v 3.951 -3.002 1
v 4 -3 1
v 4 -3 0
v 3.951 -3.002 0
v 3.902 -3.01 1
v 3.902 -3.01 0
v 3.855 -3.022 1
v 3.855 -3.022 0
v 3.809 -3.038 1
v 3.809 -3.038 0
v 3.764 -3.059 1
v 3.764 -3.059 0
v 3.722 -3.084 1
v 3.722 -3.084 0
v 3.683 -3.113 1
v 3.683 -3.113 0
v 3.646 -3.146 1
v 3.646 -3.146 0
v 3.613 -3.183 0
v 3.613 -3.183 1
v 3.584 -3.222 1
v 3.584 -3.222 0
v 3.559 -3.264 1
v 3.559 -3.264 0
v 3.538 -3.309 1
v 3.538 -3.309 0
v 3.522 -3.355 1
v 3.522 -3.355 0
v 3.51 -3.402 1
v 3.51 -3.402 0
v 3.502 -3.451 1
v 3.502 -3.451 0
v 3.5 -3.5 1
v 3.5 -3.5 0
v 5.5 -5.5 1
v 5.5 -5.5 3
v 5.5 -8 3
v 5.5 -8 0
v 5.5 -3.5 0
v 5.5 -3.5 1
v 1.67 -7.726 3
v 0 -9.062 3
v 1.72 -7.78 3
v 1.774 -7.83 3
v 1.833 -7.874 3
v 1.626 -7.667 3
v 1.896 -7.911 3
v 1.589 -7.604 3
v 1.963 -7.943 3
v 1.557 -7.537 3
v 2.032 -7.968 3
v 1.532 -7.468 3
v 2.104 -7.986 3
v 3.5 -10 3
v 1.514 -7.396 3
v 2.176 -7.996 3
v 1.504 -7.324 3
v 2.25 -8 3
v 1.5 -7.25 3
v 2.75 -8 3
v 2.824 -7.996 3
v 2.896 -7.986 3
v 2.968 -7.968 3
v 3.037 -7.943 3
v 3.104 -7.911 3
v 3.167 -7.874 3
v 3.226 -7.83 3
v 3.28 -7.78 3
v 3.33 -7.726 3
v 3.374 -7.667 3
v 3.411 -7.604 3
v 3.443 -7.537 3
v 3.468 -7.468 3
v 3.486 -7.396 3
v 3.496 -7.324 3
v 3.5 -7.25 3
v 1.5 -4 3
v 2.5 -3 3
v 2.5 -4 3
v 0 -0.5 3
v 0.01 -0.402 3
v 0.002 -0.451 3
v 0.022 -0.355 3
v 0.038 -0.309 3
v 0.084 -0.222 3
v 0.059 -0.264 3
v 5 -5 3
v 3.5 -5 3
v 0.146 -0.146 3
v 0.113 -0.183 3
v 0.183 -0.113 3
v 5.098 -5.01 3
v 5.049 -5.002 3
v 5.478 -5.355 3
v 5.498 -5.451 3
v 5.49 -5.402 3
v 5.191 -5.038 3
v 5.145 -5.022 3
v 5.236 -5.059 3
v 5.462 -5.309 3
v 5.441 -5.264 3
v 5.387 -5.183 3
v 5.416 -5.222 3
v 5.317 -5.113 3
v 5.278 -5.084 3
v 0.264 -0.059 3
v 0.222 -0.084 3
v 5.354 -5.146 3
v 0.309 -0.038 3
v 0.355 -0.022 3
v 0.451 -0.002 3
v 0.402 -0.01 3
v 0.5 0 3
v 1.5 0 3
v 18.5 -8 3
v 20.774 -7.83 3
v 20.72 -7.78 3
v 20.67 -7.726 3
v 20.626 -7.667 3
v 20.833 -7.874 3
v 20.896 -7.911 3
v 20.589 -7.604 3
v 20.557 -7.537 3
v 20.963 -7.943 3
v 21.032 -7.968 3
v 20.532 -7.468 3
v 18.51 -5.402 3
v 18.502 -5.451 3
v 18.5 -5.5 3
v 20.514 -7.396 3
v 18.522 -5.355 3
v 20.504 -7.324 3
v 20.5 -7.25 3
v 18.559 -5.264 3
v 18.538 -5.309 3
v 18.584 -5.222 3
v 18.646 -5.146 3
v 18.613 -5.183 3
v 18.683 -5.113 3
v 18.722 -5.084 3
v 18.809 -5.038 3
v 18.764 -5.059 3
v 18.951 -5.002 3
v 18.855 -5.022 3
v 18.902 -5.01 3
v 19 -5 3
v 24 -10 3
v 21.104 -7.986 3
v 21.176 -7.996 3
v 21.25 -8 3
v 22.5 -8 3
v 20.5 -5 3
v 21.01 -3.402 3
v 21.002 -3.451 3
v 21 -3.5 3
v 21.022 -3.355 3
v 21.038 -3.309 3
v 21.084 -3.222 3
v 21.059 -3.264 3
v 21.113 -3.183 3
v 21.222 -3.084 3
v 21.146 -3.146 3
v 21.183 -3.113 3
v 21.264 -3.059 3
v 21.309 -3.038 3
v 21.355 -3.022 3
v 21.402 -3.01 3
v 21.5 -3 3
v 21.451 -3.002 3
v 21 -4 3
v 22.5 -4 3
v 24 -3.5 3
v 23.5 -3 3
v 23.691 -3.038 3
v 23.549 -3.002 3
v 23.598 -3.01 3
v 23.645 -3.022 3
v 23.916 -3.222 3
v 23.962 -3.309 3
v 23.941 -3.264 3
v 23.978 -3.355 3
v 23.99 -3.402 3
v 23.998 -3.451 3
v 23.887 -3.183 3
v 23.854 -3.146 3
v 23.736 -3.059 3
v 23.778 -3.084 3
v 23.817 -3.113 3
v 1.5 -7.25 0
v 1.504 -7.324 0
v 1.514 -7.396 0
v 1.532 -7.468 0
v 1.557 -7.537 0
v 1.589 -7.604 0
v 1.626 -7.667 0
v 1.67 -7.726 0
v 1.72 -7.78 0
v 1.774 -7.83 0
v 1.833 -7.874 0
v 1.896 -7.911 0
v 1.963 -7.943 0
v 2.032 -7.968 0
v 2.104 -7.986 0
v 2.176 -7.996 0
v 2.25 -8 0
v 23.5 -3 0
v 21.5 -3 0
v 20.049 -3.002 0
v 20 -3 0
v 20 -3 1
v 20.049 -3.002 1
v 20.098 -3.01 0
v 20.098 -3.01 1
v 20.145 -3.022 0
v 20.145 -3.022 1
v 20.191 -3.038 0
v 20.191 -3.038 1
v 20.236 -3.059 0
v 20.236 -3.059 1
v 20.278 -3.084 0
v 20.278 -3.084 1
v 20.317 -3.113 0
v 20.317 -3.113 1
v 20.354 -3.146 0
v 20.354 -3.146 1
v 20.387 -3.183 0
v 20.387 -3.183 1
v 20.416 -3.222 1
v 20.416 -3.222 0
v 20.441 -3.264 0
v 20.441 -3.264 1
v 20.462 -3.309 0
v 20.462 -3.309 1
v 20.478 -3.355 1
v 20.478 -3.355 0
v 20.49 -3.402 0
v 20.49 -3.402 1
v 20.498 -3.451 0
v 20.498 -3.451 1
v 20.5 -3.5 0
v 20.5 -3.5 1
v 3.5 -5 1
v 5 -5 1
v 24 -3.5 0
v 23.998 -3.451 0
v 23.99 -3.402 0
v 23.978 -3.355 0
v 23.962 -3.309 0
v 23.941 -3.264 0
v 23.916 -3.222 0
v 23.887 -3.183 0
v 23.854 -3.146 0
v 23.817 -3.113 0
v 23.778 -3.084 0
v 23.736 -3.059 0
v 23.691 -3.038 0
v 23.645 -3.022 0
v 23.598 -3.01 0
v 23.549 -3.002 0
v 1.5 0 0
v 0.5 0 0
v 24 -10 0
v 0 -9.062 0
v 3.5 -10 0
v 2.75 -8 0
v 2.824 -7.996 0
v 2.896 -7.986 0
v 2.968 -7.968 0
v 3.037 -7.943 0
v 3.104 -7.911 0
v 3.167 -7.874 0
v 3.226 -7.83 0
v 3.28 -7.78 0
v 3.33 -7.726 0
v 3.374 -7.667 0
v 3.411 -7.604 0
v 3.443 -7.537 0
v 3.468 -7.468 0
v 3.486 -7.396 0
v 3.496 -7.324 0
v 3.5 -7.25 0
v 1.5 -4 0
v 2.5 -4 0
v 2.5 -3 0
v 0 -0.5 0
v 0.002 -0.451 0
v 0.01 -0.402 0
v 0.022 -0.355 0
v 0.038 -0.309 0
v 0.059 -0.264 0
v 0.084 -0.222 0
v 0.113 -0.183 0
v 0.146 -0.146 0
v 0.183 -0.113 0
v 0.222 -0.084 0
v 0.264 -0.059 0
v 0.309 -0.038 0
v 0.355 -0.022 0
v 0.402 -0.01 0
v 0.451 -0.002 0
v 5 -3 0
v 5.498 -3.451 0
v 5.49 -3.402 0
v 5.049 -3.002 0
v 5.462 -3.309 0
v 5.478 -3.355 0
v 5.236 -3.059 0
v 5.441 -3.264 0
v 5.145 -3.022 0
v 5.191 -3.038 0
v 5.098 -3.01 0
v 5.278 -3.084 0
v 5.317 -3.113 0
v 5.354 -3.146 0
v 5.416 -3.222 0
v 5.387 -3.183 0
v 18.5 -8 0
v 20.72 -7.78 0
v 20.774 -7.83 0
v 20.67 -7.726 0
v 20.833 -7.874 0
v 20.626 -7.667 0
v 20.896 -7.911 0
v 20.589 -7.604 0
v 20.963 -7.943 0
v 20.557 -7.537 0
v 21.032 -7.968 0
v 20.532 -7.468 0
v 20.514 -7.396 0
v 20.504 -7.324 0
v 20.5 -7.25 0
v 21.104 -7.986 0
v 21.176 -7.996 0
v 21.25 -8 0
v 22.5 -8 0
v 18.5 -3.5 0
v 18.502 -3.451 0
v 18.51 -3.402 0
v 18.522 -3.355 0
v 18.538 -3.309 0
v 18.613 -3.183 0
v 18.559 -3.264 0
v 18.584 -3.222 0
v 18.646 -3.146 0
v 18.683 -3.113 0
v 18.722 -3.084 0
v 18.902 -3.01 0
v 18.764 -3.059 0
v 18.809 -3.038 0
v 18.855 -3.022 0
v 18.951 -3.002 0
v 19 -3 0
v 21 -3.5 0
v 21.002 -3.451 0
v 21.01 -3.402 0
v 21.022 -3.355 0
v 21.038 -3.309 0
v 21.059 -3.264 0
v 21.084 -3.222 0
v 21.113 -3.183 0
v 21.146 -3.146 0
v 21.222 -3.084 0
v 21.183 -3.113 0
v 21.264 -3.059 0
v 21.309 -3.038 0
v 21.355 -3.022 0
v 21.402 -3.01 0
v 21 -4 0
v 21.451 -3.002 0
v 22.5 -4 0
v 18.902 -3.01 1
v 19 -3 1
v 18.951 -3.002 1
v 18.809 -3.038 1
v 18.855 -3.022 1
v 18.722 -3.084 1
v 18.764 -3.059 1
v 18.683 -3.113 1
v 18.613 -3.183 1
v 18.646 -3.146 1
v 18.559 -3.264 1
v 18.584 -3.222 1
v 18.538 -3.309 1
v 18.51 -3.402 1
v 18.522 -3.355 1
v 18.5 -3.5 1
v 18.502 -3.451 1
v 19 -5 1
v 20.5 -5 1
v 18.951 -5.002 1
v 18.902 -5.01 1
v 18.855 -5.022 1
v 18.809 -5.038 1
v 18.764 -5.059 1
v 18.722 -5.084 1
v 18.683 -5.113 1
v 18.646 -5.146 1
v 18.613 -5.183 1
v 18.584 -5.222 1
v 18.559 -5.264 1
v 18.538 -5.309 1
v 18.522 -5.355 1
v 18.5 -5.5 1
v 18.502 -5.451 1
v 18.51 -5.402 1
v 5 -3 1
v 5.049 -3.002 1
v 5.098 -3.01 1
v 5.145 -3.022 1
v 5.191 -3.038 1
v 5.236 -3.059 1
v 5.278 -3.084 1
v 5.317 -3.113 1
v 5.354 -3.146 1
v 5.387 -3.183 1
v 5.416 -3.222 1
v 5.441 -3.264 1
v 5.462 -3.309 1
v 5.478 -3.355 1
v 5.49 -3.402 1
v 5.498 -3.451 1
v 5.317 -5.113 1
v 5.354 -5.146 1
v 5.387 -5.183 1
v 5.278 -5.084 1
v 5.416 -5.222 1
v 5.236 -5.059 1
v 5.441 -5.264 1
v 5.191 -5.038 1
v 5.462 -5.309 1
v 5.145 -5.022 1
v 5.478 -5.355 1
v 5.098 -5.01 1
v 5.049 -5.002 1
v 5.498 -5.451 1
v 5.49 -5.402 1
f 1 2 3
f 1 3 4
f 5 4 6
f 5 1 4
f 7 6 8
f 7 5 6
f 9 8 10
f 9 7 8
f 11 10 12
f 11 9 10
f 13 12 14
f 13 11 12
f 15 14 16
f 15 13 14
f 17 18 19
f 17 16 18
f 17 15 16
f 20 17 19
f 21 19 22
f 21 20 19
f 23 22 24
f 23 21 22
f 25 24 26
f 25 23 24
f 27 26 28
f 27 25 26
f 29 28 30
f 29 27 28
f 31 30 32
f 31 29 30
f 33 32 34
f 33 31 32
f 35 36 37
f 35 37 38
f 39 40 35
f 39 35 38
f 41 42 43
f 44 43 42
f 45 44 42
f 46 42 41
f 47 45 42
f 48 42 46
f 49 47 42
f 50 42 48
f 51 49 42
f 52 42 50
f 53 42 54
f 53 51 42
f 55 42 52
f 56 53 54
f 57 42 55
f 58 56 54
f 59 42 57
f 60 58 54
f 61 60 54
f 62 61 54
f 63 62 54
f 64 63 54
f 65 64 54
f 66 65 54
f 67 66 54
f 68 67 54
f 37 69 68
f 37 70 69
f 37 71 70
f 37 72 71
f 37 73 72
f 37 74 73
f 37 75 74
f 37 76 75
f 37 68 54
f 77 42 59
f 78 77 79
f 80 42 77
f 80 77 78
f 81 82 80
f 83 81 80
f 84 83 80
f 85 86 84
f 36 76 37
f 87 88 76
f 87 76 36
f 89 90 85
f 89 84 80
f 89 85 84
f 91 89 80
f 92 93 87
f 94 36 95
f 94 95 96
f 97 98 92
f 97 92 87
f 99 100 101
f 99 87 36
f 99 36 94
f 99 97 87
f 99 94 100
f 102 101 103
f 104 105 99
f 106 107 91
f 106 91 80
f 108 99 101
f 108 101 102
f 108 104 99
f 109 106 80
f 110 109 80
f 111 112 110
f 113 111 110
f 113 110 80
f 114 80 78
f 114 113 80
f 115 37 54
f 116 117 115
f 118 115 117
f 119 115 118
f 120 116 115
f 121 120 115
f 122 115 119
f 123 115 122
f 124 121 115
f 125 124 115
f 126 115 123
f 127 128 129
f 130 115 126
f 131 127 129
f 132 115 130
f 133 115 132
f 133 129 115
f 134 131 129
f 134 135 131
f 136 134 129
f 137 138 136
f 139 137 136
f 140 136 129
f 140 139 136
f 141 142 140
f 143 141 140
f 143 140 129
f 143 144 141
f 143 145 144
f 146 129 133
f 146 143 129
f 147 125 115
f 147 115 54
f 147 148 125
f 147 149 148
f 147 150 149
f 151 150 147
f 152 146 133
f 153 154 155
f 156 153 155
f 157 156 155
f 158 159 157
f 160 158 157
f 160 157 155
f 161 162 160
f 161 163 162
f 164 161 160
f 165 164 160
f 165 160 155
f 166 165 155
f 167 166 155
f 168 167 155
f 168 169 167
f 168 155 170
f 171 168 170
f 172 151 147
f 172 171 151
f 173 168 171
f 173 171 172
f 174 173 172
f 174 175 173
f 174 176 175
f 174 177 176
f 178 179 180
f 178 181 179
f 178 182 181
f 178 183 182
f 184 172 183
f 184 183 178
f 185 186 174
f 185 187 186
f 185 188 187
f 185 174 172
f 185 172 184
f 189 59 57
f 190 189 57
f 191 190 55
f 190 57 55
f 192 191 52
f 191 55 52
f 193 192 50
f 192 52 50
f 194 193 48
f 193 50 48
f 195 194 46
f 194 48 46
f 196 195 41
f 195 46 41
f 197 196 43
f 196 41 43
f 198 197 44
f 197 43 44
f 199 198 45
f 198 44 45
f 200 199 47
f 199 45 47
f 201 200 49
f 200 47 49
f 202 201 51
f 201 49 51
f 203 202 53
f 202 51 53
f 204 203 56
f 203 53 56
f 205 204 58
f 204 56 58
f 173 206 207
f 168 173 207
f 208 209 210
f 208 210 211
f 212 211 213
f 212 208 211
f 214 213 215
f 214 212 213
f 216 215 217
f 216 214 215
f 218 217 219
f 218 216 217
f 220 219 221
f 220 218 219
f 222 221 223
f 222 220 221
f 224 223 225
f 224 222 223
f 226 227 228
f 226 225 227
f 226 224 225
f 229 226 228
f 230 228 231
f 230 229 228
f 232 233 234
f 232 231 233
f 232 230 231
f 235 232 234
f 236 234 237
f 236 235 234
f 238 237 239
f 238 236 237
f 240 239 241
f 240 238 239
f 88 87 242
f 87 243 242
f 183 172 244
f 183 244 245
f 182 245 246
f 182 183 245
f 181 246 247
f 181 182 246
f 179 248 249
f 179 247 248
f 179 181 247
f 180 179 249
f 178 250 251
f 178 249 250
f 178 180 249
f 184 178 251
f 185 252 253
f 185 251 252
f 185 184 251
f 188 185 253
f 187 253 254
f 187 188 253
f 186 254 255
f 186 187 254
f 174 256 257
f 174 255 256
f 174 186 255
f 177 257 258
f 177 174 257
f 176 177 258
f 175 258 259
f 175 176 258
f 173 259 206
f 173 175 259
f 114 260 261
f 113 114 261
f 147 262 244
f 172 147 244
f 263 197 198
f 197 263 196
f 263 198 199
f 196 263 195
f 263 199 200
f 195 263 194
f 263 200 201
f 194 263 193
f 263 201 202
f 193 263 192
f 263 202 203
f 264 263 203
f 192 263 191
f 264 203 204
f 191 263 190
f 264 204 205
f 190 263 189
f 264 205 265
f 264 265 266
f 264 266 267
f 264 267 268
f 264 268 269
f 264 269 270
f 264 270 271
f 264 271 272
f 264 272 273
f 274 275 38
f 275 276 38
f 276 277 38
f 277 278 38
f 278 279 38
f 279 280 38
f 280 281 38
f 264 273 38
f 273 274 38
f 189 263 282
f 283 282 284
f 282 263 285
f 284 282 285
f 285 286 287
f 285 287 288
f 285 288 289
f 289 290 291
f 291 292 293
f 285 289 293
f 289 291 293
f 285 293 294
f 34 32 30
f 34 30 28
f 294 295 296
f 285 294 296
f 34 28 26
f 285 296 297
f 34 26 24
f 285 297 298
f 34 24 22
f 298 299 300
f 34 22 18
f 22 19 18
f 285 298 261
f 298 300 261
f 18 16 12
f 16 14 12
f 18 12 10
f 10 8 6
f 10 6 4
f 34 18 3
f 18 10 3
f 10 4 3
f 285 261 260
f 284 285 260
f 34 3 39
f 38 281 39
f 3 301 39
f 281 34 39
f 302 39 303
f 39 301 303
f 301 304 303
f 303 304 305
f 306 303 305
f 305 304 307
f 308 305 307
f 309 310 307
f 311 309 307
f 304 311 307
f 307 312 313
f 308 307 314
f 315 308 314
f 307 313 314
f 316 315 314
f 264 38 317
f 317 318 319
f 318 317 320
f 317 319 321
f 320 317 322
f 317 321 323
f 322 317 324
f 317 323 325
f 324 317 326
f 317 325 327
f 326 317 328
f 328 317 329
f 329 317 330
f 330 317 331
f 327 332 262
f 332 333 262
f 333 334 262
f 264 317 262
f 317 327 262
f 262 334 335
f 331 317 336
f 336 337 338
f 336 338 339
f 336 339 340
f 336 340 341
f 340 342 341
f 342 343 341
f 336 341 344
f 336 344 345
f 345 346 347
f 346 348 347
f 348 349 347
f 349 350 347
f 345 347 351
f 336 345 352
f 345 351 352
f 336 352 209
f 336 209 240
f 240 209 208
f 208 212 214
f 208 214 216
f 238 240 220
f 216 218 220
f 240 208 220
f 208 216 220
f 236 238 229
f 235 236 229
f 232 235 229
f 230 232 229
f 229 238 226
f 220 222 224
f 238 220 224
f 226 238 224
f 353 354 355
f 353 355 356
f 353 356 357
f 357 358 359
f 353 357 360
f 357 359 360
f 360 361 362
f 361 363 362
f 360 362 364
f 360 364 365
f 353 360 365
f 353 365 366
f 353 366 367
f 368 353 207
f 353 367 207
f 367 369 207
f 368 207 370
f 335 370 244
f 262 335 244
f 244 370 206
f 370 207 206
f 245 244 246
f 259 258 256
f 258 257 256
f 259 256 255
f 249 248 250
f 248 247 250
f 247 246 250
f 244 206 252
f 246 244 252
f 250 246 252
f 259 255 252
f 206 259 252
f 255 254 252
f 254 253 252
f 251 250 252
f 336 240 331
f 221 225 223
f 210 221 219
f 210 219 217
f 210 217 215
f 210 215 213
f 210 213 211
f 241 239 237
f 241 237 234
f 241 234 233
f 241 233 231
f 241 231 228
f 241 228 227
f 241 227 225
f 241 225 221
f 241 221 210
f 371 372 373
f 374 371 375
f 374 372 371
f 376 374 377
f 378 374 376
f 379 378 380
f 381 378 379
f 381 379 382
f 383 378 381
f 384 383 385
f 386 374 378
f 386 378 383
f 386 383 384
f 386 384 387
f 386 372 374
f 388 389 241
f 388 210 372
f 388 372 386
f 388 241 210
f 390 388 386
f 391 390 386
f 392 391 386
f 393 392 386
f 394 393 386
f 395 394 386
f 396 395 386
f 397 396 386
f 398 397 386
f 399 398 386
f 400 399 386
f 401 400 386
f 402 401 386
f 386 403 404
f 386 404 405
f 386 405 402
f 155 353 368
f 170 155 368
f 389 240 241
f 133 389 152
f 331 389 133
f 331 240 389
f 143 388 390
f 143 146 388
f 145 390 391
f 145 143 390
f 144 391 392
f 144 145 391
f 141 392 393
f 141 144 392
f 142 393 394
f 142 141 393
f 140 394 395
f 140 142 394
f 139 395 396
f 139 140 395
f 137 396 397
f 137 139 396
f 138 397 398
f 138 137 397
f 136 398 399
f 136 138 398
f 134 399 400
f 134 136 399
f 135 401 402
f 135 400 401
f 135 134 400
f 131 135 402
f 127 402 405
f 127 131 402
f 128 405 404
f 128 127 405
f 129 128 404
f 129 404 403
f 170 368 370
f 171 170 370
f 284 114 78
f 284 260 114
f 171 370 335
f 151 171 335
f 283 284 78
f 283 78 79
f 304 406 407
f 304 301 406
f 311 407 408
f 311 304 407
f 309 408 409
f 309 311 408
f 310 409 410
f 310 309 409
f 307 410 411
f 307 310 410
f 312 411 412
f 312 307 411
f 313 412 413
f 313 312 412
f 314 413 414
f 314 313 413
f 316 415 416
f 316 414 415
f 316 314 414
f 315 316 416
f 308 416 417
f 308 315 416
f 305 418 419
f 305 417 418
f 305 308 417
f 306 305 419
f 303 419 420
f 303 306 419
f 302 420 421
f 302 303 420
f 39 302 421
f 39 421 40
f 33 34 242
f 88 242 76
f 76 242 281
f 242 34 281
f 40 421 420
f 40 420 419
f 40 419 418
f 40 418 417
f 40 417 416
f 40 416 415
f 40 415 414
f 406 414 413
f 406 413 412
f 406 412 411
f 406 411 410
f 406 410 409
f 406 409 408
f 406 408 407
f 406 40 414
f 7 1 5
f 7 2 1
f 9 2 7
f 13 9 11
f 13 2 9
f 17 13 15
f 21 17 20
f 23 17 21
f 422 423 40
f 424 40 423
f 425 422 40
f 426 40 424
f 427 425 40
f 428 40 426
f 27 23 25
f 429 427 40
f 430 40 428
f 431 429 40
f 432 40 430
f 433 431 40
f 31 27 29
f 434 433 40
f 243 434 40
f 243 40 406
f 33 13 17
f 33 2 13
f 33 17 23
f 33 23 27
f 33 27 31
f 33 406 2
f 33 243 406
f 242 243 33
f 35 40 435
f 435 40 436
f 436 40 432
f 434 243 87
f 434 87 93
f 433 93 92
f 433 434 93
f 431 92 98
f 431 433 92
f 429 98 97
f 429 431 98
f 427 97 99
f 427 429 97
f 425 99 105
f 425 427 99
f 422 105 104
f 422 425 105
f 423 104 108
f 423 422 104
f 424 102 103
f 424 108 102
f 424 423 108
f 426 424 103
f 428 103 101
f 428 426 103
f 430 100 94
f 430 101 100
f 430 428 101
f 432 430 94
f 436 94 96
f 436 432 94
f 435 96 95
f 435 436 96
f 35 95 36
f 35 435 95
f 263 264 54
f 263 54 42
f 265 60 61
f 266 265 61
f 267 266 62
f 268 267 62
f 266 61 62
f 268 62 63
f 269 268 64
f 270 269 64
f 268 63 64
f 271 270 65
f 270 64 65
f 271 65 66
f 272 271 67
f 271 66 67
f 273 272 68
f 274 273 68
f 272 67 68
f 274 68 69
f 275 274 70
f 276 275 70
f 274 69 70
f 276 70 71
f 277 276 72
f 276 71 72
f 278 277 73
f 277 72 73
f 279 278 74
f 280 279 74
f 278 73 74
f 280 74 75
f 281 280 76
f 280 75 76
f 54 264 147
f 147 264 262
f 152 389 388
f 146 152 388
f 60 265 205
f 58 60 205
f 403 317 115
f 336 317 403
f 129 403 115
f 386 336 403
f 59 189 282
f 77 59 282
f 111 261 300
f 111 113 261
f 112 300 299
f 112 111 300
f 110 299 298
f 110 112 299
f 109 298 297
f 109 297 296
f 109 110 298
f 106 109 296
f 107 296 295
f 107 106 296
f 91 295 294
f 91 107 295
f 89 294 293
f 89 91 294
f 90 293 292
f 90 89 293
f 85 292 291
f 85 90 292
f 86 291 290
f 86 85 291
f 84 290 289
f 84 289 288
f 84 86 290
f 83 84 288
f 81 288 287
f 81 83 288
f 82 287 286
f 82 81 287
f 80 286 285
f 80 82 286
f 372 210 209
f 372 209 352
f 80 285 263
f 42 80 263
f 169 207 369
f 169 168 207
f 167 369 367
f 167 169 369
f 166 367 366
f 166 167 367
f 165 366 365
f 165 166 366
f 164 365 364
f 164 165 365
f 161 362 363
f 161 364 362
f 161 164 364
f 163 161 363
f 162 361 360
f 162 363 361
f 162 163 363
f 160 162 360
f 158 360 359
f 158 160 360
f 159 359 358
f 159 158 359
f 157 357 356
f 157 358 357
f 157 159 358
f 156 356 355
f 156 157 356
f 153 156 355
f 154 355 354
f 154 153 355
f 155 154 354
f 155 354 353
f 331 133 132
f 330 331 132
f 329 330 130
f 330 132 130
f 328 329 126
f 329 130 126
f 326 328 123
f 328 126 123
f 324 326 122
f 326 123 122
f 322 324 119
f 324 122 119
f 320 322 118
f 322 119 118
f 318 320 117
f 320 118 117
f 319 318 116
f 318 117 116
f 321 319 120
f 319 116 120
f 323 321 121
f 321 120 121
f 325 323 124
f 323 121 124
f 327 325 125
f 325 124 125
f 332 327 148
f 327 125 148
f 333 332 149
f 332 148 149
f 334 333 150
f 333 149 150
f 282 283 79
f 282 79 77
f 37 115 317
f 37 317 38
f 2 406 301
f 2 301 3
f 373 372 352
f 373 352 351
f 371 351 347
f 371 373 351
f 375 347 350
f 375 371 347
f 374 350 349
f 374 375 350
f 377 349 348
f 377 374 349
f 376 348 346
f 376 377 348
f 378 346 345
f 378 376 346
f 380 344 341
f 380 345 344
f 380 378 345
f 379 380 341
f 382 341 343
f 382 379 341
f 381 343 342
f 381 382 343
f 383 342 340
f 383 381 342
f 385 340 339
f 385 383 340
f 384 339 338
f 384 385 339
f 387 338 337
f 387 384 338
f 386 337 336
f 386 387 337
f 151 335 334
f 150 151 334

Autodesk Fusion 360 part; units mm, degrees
sketch "Base" plane through (0, 0, 0) normal (0, 0, 1) x (1, 0, 0)
  line L0 (0, 0) -> (0, -9.0622)
  line L1 (24, -10) -> (24, -3)
  line L2 (22.5, -4) -> (22.5, -8)
  line L3 (20.5, -5) -> (3.5, -5)
  line L4 (1.5, -8) -> (1.5, -4)
  line L5 (1.5, 0) -> (0, 0)
  line L6 (3.5, -5) -> (3.5, -8)
  line L7 (3.5, -8) -> (1.5, -8)
  line L8 (22.5, -8) -> (20.5, -8)
  line L9 (20.5, -5) -> (20.5, -8)
  line L10 (24, -3) -> (21, -3)
  line L11 (21, -3) -> (21, -4)
  line L12 (21, -4) -> (22.5, -4)
  line L13 (1.5, 0) -> (2.5, -3)
  line L14 (2.5, -3) -> (2.5, -4)
  line L15 (2.5, -4) -> (1.5, -4)
  line L16 (21, -4) -> (2.5, -4) construction
  line L17 (3.5, -10) -> (0, -9.0622)
  line L18 (3.5, -8) -> (3.5, -10) construction
  line L19 (3.5, -10) -> (24, -10)
  dimension "d4" = 21
  dimension "d5" = 3.5
  dimension "d7" = 2
  dimension "d8" = 2
  dimension "d10" = 1
  dimension "d11" = 3
  dimension "d15" = 1
  dimension "d16" = 4
  dimension "d17" = 4
  dimension "d18" = 2.5
  dimension "d19" = 1.5
  dimension "d20" = 3
  dimension "d48" = 6
  dimension "d49" = 165
  dimension "d50" = 1.5
extrude "Extrude1" add sketch "Base" along normal blind 3
sketch "Cutout" plane through (0, -5, 0) normal (0, 1, 0) x (-1, 0, 0)
  line L0 (-20.5, 0) -> (-3.5, 0)
  line L1 (-3.5, 0) -> (-3.5, 3)
  line L2 (-3.5, 3) -> (-20.5, 3)
  line L3 (-20.5, 3) -> (-20.5, 0)
  line L4 (-5.5, 0) -> (-18.5, 0)
  line L5 (-18.5, 0) -> (-18.5, 3)
  line L6 (-18.5, 3) -> (-5.5, 3)
  line L7 (-5.5, 3) -> (-5.5, 0)
  dimension "d31" = 13
extrude "Extrude2" cut sketch "Cutout" against normal blind 3 contours L0 L2 L4 L5 L6 L7
sketch "Stand" plane through (0, -5, 0) normal (0, 1, 0) x (-1, 0, 0)
  line L0 (-5.5, 3) -> (-5.5, 0)
  line L1 (-5.5, 0) -> (-3.5, 0)
  line L2 (-3.5, 0) -> (-3.5, 3)
  line L3 (-3.5, 3) -> (-5.5, 3)
  line L4 (-3.5, 0) -> (-5.5, 0)
  line L5 (-5.5, 0) -> (-5.5, 1)
  line L6 (-5.5, 1) -> (-3.5, 1)
  line L7 (-3.5, 1) -> (-3.5, 0)
  dimension "d32" = 1
sketch "Stand (1)" plane through (0, -5, 0) normal (0, 1, 0) x (-1, 0, 0)
  line L0 (-18.5, 0) -> (-18.5, 3)
  line L1 (-18.5, 3) -> (-20.5, 3)
  line L2 (-20.5, 3) -> (-20.5, 0)
  line L3 (-20.5, 0) -> (-18.5, 0)
  line L4 (-18.5, 0) -> (-20.5, 0)
  line L5 (-20.5, 0) -> (-20.5, 1)
  line L6 (-20.5, 1) -> (-18.5, 1)
  line L7 (-18.5, 1) -> (-18.5, 0)
  dimension "d33" = 1
extrude "Extrude3" add sketch "Stand" sketch "Stand (1)" along normal blind 2 contours L0 L1 L2 L4 L5 L6 L7 of sketch 2 contours L0 L2 L3 L4 L5 L6 L7
fillet "Fillet1" radius 0.5 9 edges at (5.5, -3, 0.5) (5.5, -5, 2) (18.5, -5, 2) (18.5, -3, 0.5) (20.5, -3, 0.5) (3.5, -3, 0.5) (0, 0, 1.5) (24, -3, 1.5) (21, -3, 1.5)
fillet "Fillet1" radius 0.75 3 edges at (1.5, -8, 1.5) (20.5, -8, 1.5) (3.5, -8, 1.5)
equation "CLIP_PCB_SIZE = 21 mm"
equation "d4 = CLIP_PCB_SIZE"
equation "d31 = CLIP_PCB_SIZE - 8 mm"
